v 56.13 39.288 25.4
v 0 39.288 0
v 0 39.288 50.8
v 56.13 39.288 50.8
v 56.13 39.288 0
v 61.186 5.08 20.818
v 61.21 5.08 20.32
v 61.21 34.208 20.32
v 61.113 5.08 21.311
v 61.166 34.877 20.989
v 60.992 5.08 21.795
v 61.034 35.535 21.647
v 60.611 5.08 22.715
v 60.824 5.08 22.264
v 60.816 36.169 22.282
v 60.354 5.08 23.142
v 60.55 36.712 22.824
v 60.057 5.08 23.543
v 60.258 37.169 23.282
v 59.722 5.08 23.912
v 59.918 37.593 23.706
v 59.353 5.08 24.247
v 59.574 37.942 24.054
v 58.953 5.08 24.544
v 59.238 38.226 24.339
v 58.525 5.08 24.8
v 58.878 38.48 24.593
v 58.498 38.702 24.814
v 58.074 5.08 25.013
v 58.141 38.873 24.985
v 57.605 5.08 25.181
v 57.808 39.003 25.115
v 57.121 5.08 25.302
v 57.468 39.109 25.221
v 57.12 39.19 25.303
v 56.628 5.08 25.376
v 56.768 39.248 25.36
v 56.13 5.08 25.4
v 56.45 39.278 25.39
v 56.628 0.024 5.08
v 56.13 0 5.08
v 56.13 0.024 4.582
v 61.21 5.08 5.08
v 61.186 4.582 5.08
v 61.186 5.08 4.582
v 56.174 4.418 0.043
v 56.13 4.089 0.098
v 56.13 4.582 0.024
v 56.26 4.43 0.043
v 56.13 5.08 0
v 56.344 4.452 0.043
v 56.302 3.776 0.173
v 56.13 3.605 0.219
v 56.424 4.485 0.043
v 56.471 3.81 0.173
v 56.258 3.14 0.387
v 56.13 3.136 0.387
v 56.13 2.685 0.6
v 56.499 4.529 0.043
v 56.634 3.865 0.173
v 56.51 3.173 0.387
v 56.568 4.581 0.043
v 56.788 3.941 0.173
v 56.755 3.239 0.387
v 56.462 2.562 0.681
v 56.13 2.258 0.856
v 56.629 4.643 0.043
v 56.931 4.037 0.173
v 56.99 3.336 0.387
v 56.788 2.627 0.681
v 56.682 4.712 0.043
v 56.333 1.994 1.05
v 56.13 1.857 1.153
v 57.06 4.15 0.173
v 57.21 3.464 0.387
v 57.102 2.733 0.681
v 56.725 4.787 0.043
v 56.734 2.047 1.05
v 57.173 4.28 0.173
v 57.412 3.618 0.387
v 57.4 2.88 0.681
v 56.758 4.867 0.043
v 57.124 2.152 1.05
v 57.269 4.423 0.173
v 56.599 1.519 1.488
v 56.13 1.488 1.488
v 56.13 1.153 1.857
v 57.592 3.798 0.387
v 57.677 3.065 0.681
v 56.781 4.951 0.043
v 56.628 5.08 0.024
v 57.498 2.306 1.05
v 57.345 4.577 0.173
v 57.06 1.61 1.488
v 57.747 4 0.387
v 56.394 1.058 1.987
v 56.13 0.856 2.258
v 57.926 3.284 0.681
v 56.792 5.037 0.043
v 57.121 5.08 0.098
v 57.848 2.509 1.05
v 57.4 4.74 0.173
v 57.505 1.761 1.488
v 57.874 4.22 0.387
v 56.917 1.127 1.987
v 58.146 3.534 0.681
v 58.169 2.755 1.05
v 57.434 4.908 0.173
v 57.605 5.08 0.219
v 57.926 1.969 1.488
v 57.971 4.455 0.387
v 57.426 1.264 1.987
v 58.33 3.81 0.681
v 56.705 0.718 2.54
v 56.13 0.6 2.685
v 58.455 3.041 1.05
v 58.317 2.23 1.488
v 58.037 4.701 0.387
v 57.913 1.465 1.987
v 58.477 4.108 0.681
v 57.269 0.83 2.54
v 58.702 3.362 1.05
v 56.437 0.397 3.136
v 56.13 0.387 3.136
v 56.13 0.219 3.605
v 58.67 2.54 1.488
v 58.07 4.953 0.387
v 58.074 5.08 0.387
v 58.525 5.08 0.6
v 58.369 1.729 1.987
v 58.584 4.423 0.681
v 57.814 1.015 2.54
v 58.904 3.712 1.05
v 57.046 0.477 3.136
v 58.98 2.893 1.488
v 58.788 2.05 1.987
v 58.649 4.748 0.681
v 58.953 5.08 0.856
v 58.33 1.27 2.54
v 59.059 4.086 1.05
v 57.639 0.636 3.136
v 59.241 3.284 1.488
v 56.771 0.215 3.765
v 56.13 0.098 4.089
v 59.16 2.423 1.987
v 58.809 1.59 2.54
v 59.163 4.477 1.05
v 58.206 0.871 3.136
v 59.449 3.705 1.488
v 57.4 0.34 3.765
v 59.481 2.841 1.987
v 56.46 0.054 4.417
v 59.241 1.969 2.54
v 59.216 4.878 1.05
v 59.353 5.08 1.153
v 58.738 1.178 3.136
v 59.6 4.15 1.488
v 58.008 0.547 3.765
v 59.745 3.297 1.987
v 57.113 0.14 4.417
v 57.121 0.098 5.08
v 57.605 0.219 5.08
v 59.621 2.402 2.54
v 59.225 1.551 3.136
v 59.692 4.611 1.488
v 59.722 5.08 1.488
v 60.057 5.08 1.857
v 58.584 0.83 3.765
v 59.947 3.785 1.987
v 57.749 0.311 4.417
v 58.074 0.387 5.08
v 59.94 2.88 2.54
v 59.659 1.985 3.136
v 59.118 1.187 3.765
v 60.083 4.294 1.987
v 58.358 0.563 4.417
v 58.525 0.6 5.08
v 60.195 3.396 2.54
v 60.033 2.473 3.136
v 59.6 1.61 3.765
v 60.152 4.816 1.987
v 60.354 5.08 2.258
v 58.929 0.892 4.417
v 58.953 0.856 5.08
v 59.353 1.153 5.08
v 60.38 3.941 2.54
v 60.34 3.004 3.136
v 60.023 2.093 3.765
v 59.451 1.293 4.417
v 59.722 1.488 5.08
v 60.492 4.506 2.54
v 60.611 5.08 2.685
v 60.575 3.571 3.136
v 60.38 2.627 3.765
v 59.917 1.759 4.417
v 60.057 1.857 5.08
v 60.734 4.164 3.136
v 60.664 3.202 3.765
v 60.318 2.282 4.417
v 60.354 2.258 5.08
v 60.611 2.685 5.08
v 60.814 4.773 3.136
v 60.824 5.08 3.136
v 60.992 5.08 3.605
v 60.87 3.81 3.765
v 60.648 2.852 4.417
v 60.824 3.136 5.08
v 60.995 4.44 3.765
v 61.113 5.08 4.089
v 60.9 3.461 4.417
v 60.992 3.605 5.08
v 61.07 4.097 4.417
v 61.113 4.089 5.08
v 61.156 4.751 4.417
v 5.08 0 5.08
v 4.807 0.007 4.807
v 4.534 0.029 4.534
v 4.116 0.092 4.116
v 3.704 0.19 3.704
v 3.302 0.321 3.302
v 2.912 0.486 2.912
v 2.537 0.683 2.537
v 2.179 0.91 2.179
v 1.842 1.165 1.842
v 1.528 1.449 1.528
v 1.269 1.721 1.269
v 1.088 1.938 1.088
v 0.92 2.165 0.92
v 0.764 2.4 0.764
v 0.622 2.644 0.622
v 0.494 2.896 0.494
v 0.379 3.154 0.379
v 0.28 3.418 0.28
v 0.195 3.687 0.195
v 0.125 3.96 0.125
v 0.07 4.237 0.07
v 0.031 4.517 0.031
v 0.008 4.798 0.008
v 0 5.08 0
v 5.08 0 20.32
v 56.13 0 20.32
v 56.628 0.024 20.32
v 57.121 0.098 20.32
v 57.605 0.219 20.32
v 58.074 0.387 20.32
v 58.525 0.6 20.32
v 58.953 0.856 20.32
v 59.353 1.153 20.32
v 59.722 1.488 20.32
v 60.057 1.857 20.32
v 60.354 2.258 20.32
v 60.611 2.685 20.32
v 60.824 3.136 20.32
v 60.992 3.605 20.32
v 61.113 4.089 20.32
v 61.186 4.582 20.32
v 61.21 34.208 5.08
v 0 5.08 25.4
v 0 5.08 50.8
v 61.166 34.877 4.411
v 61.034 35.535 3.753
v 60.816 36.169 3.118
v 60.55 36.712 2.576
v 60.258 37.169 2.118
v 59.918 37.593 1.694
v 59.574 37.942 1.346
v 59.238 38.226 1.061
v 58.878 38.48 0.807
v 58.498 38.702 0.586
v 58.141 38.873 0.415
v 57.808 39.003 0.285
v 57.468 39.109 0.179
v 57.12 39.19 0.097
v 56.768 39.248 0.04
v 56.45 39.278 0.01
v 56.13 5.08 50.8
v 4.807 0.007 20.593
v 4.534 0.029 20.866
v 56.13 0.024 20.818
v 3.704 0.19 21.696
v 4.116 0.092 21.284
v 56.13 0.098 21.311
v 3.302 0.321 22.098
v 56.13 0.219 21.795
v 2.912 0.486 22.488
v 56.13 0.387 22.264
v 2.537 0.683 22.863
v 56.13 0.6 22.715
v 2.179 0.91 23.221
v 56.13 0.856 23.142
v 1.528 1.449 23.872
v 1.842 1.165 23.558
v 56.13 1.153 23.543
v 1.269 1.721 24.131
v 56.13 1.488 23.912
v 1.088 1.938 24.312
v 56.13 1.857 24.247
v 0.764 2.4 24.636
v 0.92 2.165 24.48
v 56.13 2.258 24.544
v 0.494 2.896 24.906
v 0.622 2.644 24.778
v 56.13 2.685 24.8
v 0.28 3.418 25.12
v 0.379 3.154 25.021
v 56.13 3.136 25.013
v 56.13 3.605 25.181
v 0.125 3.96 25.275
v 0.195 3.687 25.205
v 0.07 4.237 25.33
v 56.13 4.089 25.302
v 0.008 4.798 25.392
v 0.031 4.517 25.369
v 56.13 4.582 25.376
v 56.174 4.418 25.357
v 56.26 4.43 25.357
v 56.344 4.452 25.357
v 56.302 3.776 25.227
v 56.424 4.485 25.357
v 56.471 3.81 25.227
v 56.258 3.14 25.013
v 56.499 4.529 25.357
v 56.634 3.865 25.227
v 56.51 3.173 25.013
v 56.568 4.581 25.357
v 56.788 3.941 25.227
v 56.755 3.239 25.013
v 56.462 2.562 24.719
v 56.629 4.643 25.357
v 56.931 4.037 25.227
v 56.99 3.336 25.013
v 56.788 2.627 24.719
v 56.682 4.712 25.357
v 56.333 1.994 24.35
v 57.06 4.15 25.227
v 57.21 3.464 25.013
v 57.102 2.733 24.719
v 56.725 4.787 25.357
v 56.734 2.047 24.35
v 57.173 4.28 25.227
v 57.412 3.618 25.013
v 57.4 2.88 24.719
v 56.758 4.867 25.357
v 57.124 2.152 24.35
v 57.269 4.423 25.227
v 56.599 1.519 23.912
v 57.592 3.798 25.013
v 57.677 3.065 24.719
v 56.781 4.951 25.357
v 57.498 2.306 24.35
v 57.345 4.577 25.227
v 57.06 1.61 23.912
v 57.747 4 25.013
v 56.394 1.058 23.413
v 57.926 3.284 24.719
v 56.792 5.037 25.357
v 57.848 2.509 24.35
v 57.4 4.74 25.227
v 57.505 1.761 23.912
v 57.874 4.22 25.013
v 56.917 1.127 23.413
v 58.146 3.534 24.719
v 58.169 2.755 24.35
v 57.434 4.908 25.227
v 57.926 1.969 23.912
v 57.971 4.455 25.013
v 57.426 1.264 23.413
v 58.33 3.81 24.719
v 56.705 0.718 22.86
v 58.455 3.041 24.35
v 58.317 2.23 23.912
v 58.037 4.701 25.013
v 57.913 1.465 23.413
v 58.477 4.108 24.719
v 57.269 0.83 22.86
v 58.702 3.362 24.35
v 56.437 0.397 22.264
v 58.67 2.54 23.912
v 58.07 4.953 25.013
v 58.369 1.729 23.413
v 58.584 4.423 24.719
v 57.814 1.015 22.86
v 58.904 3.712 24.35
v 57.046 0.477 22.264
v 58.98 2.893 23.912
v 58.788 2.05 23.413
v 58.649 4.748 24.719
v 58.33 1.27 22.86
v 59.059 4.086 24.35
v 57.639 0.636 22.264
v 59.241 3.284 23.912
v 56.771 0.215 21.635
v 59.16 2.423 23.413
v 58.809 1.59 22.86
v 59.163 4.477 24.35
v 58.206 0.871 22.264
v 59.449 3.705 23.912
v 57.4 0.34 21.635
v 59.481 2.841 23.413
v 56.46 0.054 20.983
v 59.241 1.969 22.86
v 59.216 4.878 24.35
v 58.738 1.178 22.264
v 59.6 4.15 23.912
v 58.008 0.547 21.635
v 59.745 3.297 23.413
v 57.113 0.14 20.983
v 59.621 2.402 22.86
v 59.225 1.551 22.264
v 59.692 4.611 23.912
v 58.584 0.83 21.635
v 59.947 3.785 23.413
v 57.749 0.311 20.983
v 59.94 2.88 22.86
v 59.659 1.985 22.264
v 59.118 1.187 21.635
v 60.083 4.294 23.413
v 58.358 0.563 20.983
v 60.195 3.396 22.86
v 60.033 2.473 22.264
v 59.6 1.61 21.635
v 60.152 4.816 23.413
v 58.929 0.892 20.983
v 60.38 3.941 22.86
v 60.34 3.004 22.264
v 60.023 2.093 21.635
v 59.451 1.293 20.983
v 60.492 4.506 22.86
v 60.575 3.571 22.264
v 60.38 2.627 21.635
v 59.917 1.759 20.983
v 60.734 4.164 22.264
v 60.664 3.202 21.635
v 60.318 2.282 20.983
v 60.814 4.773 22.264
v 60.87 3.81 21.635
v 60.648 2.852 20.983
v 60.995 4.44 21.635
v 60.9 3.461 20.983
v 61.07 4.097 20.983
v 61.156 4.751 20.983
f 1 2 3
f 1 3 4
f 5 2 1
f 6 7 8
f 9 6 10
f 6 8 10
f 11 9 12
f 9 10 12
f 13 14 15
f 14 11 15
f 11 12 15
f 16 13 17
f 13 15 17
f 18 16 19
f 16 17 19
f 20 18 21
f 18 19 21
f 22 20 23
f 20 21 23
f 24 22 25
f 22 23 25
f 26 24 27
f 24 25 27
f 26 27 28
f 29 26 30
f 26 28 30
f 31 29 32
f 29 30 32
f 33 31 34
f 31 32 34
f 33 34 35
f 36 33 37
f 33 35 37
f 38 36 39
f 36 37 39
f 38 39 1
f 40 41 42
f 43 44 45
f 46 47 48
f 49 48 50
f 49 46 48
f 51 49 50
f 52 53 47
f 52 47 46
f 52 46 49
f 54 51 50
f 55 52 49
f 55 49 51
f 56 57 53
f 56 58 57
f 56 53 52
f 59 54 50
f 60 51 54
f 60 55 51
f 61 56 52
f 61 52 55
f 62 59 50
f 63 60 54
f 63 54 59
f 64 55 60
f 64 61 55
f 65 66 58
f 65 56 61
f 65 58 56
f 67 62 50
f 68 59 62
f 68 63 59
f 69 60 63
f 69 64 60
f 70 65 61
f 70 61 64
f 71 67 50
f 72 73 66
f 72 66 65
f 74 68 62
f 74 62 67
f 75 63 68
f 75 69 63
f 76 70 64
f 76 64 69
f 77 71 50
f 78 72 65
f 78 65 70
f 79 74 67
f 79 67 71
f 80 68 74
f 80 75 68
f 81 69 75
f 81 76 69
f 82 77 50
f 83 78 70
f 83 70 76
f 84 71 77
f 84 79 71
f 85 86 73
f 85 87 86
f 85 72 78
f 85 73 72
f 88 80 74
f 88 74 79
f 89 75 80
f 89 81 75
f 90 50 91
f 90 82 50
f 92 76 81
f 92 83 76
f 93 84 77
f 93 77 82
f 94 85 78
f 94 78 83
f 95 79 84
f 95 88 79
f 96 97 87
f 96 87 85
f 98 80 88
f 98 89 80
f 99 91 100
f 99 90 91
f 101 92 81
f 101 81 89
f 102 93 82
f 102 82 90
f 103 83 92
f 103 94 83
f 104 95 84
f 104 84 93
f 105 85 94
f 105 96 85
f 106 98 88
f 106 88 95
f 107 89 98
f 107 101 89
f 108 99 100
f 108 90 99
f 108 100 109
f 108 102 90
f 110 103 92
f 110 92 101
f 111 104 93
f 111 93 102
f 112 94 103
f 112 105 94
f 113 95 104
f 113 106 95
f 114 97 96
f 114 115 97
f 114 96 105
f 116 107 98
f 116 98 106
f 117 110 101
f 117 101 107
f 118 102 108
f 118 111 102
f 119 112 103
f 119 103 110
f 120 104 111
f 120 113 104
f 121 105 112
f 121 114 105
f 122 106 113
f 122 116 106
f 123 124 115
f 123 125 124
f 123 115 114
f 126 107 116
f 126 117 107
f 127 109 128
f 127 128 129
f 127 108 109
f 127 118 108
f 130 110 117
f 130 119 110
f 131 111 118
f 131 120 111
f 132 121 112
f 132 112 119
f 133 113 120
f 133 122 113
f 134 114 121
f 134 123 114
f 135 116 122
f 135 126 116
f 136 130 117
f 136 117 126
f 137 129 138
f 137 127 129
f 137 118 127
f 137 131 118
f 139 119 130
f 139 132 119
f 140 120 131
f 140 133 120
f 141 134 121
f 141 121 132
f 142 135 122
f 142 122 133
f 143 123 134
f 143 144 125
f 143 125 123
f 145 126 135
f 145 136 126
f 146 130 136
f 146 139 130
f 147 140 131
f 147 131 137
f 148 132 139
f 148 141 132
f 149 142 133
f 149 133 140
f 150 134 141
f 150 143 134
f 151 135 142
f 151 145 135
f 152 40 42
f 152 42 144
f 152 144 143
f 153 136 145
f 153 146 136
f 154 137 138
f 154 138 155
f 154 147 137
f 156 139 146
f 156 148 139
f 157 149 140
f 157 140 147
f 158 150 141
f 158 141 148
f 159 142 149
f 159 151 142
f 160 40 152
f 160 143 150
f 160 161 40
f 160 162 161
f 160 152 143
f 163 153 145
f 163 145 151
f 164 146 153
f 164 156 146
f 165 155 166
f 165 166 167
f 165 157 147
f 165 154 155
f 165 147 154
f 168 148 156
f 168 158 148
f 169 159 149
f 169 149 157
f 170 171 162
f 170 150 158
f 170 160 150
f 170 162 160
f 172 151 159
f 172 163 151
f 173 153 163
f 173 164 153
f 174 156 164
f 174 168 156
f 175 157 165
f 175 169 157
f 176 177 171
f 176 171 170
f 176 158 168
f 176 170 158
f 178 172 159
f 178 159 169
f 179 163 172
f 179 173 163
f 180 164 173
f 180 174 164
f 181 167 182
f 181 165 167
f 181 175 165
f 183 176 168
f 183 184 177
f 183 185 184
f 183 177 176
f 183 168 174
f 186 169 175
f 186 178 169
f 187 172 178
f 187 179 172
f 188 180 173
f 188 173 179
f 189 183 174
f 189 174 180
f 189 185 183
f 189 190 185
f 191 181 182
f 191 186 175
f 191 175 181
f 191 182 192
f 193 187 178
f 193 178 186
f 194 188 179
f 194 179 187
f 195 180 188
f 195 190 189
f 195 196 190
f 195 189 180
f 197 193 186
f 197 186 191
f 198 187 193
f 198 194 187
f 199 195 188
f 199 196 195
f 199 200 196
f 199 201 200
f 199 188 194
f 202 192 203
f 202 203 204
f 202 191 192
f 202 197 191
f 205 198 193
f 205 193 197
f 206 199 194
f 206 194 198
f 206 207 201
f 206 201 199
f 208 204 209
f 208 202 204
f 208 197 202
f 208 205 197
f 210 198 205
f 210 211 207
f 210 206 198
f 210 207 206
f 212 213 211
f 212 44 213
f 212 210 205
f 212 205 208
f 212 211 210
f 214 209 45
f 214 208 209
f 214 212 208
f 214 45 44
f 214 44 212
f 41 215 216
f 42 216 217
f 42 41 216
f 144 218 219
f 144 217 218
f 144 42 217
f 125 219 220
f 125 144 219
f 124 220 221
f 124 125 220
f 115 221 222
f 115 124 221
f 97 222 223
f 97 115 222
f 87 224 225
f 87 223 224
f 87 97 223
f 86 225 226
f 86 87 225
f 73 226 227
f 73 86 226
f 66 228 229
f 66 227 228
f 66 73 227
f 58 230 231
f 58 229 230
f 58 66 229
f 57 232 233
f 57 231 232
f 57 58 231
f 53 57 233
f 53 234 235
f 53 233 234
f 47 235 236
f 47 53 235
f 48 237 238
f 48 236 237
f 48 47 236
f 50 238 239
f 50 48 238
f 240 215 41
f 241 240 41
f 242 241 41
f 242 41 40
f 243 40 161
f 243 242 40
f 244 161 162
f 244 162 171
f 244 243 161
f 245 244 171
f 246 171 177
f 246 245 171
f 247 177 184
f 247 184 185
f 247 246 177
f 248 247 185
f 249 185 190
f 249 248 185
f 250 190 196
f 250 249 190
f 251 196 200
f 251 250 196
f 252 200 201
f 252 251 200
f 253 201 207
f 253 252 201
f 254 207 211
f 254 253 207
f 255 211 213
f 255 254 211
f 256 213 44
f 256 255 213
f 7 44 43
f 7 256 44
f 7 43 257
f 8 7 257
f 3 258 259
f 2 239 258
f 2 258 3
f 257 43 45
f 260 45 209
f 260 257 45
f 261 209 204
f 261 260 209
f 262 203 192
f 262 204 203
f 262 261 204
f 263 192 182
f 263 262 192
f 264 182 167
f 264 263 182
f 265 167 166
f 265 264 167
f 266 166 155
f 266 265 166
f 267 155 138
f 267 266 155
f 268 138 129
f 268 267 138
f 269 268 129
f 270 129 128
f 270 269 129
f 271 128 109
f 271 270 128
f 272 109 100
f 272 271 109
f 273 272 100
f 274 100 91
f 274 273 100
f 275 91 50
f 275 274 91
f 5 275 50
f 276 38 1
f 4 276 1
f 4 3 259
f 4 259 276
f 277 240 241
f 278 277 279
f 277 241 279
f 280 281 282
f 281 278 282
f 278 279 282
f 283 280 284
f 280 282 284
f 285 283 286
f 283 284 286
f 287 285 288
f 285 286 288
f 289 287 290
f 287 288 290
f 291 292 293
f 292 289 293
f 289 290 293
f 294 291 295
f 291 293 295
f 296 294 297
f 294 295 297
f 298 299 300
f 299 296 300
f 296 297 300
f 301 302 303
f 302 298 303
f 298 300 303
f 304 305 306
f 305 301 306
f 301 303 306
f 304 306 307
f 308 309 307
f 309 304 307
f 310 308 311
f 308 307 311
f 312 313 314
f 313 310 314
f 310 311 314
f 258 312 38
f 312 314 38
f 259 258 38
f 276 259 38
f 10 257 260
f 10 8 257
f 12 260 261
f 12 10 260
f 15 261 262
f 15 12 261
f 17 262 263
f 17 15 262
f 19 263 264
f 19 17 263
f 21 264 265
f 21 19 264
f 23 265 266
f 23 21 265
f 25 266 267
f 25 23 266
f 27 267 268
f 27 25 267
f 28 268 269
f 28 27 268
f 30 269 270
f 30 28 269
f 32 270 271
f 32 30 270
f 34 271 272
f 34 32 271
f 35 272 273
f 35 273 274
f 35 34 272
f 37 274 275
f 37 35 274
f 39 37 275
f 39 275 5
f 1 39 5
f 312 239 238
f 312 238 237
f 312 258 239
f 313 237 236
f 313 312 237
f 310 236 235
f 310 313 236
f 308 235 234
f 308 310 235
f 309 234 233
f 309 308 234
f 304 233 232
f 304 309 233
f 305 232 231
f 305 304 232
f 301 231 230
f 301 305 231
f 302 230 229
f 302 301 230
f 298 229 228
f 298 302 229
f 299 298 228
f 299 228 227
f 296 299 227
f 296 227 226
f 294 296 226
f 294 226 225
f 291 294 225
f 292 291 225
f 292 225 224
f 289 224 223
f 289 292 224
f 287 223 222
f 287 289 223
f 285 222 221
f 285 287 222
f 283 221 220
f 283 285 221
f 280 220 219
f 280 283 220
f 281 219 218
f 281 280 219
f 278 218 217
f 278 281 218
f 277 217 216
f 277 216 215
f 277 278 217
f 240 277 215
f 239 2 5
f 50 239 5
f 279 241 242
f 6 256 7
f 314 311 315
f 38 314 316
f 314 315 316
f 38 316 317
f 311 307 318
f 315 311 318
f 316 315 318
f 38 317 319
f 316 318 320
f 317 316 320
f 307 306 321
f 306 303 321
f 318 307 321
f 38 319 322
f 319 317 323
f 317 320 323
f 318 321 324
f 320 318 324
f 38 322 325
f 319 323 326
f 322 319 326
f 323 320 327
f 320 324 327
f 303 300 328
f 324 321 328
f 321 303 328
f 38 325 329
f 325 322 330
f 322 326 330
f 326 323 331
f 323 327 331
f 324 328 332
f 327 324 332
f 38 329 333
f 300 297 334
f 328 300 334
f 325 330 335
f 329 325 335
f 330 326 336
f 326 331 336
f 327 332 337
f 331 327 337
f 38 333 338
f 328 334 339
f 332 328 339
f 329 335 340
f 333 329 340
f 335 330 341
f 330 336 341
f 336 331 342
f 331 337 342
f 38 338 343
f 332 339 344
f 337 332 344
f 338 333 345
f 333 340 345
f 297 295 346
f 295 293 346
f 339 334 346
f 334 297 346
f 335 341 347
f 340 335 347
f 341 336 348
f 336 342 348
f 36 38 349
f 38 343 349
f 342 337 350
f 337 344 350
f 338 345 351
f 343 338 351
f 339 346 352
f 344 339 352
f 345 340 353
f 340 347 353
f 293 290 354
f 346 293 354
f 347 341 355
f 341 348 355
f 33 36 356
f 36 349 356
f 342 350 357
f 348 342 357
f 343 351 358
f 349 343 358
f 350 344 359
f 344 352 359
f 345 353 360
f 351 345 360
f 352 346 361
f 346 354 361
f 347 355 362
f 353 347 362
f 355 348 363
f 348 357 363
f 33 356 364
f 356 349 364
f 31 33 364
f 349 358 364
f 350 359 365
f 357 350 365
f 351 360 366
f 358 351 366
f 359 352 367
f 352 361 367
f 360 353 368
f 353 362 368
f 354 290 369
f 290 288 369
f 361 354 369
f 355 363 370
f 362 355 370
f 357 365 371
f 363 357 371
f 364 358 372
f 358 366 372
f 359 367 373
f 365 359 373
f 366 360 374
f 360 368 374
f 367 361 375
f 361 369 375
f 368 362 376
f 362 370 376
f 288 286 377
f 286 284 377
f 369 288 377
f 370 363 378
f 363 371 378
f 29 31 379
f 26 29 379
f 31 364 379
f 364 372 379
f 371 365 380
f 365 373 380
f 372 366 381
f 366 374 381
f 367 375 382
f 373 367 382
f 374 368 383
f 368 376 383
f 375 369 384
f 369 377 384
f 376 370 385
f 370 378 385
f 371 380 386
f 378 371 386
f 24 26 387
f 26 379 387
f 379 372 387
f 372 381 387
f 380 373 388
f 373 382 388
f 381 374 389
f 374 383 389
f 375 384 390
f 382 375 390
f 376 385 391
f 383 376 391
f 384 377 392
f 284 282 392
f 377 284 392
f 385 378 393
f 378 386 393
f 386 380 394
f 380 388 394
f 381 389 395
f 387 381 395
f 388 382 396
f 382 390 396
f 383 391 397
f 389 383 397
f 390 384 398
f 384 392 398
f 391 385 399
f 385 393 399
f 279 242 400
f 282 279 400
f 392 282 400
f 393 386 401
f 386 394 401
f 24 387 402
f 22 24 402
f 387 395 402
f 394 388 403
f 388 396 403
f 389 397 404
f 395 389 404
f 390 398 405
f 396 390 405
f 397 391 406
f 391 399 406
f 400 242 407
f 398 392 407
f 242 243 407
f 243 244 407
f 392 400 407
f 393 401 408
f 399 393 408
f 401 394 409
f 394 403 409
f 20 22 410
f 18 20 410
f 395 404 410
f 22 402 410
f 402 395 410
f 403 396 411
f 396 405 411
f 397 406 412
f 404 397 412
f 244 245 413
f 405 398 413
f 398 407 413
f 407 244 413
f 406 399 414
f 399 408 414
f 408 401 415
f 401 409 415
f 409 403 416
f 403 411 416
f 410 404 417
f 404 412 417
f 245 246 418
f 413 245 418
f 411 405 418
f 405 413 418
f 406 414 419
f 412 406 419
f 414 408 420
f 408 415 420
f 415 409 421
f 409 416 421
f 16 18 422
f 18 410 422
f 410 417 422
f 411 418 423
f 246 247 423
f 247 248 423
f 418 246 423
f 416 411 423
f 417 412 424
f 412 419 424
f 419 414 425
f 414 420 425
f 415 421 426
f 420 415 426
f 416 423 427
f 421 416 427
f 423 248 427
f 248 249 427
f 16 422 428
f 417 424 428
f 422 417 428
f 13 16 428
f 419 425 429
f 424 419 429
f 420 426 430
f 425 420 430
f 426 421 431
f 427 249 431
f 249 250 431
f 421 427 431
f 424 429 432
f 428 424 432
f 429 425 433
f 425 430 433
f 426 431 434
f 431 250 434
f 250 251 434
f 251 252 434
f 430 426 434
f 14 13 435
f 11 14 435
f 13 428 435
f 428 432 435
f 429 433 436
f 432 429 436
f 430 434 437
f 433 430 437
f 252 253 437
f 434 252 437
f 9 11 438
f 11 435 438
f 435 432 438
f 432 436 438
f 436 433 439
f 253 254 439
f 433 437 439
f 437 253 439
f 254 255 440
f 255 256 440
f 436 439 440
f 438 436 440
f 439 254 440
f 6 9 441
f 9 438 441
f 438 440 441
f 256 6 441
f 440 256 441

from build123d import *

# Parameters (mm, degrees)
F0_W      = 61.210394
F0_H      = 39.28775
F1_DEPTH  = 25.4
F2_R      = 5.08
F1_FACE_W = 56.130394
F1_FACE_H = 34.20775
F3_DEPTH  = 25.4


with BuildPart() as f1:
    # F0 (on Top) → F1 (new body)
    with BuildSketch(Plane.XY):
        with Locations((30.605197, 19.643875)):
            Rectangle(F0_W, F0_H)
    extrude(amount=F1_DEPTH)

    # F2
    f2_edges = [f1.edges().sort_by_distance(p)[0] for p in [
        (0, 0, 12.7),
        (61.210394, 0, 12.7),
        (30.605197, 0, 0),
        (30.605197, 0, 25.4),
        (61.210394, 19.643875, 25.4),
        (61.210394, 39.28775, 12.7),
        (61.210394, 19.643875, 0),
    ]]
    fillet(f2_edges, radius=F2_R)

    # F1_face (on face) → F3 (join)
    with BuildSketch(Plane(origin=(28.065197, 22.183875, 25.4), x_dir=(1, 0, 0), z_dir=(0, 0, 1))):
        Rectangle(F1_FACE_W, F1_FACE_H)
    extrude(amount=F3_DEPTH)


solid = f1.part
